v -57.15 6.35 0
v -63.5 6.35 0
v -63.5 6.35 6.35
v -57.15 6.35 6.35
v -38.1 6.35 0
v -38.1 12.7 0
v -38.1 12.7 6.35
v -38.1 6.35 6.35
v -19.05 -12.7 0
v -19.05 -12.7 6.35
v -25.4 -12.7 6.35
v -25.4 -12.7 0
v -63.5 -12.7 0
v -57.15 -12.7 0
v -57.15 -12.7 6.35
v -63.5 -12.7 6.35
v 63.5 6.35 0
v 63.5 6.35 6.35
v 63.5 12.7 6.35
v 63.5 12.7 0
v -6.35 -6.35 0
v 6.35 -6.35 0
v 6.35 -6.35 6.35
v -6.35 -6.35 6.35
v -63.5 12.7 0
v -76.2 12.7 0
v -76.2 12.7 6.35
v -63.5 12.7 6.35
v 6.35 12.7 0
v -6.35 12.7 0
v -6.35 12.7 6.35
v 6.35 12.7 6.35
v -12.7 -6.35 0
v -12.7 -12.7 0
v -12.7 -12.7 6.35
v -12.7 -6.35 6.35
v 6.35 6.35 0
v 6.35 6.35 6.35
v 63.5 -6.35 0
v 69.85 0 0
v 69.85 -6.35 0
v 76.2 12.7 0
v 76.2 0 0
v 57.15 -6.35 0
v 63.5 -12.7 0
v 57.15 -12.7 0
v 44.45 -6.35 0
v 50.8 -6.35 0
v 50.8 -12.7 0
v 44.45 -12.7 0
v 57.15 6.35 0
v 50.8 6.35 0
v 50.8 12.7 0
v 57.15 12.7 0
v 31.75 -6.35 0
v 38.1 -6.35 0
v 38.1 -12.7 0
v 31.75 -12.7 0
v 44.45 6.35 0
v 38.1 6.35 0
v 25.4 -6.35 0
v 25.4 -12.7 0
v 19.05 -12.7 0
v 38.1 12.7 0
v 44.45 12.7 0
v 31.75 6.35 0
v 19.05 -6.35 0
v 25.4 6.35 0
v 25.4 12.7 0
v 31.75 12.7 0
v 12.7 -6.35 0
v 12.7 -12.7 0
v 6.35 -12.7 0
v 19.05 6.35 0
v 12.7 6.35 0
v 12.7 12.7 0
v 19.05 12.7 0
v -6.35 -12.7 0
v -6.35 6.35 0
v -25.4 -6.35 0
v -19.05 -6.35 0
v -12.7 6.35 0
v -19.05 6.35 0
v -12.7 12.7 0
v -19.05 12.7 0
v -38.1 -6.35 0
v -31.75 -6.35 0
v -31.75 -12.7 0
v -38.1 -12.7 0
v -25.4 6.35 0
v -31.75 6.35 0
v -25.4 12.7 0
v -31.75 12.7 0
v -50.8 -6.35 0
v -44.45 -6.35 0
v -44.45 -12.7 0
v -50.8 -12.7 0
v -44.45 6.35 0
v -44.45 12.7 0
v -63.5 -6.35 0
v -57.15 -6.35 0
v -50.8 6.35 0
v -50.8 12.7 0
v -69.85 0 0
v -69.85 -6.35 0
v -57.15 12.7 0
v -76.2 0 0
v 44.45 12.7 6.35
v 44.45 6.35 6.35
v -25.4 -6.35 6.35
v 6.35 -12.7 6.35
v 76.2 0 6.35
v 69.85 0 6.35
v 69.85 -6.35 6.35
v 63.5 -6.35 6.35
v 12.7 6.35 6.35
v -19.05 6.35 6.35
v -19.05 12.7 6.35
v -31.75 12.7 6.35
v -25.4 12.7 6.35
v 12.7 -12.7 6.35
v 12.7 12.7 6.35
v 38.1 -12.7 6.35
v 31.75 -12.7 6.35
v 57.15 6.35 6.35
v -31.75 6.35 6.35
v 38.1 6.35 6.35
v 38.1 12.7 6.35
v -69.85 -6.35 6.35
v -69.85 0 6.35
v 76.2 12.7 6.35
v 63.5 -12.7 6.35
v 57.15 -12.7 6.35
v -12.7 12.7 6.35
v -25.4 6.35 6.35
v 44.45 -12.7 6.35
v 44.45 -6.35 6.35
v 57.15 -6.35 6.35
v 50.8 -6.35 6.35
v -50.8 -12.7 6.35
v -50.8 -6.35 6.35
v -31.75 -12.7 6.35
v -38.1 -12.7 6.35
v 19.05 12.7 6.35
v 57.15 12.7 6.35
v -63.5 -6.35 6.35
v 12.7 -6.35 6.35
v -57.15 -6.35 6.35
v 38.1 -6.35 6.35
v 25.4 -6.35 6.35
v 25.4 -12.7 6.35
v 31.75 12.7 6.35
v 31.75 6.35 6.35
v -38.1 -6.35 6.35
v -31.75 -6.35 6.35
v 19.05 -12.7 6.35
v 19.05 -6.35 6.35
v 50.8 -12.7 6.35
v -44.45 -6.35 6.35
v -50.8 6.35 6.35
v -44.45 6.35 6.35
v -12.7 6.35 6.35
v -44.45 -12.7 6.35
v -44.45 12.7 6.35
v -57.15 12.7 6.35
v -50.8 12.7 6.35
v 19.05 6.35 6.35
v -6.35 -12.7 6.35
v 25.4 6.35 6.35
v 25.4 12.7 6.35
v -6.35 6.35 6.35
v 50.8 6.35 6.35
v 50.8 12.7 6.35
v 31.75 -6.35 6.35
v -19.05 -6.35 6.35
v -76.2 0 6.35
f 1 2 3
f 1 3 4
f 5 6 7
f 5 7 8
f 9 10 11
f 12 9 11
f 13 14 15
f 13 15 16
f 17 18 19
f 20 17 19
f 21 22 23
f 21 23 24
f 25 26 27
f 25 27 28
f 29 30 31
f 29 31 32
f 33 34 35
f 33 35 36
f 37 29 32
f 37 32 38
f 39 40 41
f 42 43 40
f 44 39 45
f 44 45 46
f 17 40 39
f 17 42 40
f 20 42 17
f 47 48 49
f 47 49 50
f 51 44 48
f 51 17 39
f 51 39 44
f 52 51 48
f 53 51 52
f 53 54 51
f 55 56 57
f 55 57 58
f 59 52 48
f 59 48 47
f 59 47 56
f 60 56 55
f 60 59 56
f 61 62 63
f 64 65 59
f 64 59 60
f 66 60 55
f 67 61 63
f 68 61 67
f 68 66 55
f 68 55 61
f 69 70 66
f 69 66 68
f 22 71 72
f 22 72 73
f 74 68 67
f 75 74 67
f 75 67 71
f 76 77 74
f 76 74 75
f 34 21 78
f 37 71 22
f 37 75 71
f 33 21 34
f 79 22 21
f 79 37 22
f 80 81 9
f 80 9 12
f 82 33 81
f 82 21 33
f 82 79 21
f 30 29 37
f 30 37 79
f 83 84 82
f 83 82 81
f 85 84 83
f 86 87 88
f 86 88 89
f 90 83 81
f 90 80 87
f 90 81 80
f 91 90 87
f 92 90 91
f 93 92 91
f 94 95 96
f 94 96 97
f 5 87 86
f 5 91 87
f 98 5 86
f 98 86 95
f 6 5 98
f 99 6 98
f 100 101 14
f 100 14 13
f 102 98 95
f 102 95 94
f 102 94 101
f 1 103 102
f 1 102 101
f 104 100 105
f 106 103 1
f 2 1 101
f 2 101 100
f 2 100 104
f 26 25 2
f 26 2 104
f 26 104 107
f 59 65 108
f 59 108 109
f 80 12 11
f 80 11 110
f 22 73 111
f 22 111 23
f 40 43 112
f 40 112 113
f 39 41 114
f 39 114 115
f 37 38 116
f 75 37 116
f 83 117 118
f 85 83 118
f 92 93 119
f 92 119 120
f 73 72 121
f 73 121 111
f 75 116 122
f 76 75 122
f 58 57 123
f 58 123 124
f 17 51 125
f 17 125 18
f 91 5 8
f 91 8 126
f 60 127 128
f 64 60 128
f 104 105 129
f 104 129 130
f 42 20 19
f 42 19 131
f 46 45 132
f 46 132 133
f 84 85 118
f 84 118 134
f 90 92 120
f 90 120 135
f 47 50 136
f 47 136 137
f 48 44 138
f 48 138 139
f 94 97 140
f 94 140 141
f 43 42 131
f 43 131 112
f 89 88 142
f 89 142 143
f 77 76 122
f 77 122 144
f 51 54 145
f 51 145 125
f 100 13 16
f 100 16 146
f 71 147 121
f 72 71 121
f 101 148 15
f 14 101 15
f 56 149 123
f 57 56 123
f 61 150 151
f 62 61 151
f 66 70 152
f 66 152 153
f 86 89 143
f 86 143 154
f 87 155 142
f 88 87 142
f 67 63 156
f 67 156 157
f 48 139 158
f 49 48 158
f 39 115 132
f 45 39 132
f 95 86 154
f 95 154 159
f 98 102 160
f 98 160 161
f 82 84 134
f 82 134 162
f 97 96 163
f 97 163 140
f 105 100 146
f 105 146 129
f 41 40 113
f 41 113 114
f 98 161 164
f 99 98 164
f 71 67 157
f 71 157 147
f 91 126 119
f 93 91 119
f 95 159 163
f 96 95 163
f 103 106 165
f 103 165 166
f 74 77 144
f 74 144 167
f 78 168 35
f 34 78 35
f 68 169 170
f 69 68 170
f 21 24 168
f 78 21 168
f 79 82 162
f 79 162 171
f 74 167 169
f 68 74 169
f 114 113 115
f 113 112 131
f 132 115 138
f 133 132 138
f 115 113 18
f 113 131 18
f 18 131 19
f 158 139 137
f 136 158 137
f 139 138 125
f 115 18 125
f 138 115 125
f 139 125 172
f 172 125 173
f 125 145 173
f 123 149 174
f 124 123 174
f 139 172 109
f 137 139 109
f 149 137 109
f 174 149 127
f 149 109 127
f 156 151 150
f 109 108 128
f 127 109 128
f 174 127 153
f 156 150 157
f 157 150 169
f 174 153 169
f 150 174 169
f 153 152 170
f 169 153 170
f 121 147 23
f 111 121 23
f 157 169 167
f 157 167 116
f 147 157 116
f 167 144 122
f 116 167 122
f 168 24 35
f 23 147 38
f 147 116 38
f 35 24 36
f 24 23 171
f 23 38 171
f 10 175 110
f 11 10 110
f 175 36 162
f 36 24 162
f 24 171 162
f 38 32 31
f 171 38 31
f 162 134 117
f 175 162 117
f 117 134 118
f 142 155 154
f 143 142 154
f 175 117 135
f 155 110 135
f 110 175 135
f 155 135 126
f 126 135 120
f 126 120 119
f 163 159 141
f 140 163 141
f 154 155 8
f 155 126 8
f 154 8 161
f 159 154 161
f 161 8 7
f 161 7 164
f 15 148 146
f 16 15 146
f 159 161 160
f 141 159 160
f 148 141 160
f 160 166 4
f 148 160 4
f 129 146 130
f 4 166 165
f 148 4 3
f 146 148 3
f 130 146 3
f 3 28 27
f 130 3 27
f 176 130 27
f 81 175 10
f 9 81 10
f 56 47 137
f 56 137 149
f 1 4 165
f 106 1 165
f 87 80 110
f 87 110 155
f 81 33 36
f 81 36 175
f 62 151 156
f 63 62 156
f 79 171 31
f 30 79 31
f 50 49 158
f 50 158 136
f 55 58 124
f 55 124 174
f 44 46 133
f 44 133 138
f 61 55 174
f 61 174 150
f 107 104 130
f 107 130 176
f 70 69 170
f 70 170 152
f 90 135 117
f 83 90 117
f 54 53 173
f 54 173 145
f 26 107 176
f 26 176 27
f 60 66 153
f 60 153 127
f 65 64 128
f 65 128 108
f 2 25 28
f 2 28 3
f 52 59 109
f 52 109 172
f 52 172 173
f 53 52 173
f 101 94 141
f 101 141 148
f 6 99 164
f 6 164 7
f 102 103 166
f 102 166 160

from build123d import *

# Parameters (mm, degrees)
BOSS_EXTRUDE1_DEPTH = 6.35


with BuildPart() as part:
    # Sketch1 → Boss-Extrude1 (new body)
    with BuildSketch(Plane.XY):
        Polygon((-76.2, 12.7), (-63.5, 12.7), (-63.5, 6.35), (-57.15, 6.35), (-57.15, 12.7), (-50.8, 12.7), (-50.8, 6.35), (-44.45, 6.35), (-44.45, 12.7), (-38.1, 12.7), (-38.1, 6.35), (-31.75, 6.35), (-31.75, 12.7), (-25.4, 12.7), (-25.4, 6.35), (-19.05, 6.35), (-19.05, 12.7), (-12.7, 12.7), (-12.7, 6.35), (-6.35, 6.35), (-6.35, 12.7), (6.35, 12.7), (6.35, 6.35), (12.7, 6.35), (12.7, 12.7), (19.05, 12.7), (19.05, 6.35), (25.4, 6.35), (25.4, 12.7), (31.75, 12.7), (31.75, 6.35), (38.1, 6.35), (38.1, 12.7), (44.45, 12.7), (44.45, 6.35), (50.8, 6.35), (50.8, 12.7), (57.15, 12.7), (57.15, 6.35), (63.5, 6.35), (63.5, 12.7), (76.2, 12.7), (76.2, 0), (69.85, 0), (69.85, -6.35), (63.5, -6.35), (63.5, -12.7), (57.15, -12.7), (57.15, -6.35), (50.8, -6.35), (50.8, -12.7), (44.45, -12.7), (44.45, -6.35), (38.1, -6.35), (38.1, -12.7), (31.75, -12.7), (31.75, -6.35), (25.4, -6.35), (25.4, -12.7), (19.05, -12.7), (19.05, -6.35), (12.7, -6.35), (12.7, -12.7), (6.35, -12.7), (6.35, -6.35), (-6.35, -6.35), (-6.35, -12.7), (-12.7, -12.7), (-12.7, -6.35), (-19.05, -6.35), (-19.05, -12.7), (-25.4, -12.7), (-25.4, -6.35), (-31.75, -6.35), (-31.75, -12.7), (-38.1, -12.7), (-38.1, -6.35), (-44.45, -6.35), (-44.45, -12.7), (-50.8, -12.7), (-50.8, -6.35), (-57.15, -6.35), (-57.15, -12.7), (-63.5, -12.7), (-63.5, -6.35), (-69.85, -6.35), (-69.85, 0), (-76.2, 0), align=None)
    extrude(amount=BOSS_EXTRUDE1_DEPTH)


solid = part.part
